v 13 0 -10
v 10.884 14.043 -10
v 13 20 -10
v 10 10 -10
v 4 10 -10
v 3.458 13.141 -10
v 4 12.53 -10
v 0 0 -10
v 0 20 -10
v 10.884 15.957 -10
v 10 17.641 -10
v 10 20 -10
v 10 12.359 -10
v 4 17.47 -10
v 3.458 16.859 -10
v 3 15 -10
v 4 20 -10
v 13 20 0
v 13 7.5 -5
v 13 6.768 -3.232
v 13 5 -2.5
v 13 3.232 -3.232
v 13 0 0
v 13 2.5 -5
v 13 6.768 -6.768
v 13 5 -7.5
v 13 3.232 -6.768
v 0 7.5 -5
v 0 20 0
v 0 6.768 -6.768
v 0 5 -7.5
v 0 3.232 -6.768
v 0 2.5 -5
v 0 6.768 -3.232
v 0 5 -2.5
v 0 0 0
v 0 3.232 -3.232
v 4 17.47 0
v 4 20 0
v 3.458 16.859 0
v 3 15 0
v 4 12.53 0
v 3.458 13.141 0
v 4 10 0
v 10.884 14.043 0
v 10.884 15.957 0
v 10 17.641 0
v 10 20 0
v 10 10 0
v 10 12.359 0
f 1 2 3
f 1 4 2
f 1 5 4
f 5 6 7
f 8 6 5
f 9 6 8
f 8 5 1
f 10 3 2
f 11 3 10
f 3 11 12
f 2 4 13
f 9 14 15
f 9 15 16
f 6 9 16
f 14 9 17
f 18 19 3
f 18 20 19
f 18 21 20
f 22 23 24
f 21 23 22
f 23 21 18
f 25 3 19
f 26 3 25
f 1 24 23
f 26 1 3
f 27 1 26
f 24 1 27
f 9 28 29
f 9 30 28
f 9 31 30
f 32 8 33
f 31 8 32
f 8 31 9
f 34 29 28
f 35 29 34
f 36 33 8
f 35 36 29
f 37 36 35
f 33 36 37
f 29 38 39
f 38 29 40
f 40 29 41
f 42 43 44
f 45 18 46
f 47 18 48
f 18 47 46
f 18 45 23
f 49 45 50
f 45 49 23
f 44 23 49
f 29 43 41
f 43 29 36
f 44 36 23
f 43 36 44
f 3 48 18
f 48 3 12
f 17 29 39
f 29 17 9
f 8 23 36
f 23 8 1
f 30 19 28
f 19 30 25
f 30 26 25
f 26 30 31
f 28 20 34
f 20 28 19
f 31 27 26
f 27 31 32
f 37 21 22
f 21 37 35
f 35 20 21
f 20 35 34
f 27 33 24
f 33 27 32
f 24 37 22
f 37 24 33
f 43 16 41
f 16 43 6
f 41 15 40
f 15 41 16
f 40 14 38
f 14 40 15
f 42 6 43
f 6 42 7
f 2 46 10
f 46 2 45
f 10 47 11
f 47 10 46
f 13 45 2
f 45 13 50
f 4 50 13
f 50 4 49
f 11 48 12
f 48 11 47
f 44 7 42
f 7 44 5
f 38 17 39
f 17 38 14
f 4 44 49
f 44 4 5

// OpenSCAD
cd = 35;
ce = 20;
rotate([0,90,0])difference(){
cube([10,20,13]);
translate([5,5,0])#cylinder(r=2.5,h=20);
translate([-1,15,7]) rotate([0,90,0])#cylinder(r=4,h=20);
translate([0,10,7-3]) #cube([10,15,6]);
}
